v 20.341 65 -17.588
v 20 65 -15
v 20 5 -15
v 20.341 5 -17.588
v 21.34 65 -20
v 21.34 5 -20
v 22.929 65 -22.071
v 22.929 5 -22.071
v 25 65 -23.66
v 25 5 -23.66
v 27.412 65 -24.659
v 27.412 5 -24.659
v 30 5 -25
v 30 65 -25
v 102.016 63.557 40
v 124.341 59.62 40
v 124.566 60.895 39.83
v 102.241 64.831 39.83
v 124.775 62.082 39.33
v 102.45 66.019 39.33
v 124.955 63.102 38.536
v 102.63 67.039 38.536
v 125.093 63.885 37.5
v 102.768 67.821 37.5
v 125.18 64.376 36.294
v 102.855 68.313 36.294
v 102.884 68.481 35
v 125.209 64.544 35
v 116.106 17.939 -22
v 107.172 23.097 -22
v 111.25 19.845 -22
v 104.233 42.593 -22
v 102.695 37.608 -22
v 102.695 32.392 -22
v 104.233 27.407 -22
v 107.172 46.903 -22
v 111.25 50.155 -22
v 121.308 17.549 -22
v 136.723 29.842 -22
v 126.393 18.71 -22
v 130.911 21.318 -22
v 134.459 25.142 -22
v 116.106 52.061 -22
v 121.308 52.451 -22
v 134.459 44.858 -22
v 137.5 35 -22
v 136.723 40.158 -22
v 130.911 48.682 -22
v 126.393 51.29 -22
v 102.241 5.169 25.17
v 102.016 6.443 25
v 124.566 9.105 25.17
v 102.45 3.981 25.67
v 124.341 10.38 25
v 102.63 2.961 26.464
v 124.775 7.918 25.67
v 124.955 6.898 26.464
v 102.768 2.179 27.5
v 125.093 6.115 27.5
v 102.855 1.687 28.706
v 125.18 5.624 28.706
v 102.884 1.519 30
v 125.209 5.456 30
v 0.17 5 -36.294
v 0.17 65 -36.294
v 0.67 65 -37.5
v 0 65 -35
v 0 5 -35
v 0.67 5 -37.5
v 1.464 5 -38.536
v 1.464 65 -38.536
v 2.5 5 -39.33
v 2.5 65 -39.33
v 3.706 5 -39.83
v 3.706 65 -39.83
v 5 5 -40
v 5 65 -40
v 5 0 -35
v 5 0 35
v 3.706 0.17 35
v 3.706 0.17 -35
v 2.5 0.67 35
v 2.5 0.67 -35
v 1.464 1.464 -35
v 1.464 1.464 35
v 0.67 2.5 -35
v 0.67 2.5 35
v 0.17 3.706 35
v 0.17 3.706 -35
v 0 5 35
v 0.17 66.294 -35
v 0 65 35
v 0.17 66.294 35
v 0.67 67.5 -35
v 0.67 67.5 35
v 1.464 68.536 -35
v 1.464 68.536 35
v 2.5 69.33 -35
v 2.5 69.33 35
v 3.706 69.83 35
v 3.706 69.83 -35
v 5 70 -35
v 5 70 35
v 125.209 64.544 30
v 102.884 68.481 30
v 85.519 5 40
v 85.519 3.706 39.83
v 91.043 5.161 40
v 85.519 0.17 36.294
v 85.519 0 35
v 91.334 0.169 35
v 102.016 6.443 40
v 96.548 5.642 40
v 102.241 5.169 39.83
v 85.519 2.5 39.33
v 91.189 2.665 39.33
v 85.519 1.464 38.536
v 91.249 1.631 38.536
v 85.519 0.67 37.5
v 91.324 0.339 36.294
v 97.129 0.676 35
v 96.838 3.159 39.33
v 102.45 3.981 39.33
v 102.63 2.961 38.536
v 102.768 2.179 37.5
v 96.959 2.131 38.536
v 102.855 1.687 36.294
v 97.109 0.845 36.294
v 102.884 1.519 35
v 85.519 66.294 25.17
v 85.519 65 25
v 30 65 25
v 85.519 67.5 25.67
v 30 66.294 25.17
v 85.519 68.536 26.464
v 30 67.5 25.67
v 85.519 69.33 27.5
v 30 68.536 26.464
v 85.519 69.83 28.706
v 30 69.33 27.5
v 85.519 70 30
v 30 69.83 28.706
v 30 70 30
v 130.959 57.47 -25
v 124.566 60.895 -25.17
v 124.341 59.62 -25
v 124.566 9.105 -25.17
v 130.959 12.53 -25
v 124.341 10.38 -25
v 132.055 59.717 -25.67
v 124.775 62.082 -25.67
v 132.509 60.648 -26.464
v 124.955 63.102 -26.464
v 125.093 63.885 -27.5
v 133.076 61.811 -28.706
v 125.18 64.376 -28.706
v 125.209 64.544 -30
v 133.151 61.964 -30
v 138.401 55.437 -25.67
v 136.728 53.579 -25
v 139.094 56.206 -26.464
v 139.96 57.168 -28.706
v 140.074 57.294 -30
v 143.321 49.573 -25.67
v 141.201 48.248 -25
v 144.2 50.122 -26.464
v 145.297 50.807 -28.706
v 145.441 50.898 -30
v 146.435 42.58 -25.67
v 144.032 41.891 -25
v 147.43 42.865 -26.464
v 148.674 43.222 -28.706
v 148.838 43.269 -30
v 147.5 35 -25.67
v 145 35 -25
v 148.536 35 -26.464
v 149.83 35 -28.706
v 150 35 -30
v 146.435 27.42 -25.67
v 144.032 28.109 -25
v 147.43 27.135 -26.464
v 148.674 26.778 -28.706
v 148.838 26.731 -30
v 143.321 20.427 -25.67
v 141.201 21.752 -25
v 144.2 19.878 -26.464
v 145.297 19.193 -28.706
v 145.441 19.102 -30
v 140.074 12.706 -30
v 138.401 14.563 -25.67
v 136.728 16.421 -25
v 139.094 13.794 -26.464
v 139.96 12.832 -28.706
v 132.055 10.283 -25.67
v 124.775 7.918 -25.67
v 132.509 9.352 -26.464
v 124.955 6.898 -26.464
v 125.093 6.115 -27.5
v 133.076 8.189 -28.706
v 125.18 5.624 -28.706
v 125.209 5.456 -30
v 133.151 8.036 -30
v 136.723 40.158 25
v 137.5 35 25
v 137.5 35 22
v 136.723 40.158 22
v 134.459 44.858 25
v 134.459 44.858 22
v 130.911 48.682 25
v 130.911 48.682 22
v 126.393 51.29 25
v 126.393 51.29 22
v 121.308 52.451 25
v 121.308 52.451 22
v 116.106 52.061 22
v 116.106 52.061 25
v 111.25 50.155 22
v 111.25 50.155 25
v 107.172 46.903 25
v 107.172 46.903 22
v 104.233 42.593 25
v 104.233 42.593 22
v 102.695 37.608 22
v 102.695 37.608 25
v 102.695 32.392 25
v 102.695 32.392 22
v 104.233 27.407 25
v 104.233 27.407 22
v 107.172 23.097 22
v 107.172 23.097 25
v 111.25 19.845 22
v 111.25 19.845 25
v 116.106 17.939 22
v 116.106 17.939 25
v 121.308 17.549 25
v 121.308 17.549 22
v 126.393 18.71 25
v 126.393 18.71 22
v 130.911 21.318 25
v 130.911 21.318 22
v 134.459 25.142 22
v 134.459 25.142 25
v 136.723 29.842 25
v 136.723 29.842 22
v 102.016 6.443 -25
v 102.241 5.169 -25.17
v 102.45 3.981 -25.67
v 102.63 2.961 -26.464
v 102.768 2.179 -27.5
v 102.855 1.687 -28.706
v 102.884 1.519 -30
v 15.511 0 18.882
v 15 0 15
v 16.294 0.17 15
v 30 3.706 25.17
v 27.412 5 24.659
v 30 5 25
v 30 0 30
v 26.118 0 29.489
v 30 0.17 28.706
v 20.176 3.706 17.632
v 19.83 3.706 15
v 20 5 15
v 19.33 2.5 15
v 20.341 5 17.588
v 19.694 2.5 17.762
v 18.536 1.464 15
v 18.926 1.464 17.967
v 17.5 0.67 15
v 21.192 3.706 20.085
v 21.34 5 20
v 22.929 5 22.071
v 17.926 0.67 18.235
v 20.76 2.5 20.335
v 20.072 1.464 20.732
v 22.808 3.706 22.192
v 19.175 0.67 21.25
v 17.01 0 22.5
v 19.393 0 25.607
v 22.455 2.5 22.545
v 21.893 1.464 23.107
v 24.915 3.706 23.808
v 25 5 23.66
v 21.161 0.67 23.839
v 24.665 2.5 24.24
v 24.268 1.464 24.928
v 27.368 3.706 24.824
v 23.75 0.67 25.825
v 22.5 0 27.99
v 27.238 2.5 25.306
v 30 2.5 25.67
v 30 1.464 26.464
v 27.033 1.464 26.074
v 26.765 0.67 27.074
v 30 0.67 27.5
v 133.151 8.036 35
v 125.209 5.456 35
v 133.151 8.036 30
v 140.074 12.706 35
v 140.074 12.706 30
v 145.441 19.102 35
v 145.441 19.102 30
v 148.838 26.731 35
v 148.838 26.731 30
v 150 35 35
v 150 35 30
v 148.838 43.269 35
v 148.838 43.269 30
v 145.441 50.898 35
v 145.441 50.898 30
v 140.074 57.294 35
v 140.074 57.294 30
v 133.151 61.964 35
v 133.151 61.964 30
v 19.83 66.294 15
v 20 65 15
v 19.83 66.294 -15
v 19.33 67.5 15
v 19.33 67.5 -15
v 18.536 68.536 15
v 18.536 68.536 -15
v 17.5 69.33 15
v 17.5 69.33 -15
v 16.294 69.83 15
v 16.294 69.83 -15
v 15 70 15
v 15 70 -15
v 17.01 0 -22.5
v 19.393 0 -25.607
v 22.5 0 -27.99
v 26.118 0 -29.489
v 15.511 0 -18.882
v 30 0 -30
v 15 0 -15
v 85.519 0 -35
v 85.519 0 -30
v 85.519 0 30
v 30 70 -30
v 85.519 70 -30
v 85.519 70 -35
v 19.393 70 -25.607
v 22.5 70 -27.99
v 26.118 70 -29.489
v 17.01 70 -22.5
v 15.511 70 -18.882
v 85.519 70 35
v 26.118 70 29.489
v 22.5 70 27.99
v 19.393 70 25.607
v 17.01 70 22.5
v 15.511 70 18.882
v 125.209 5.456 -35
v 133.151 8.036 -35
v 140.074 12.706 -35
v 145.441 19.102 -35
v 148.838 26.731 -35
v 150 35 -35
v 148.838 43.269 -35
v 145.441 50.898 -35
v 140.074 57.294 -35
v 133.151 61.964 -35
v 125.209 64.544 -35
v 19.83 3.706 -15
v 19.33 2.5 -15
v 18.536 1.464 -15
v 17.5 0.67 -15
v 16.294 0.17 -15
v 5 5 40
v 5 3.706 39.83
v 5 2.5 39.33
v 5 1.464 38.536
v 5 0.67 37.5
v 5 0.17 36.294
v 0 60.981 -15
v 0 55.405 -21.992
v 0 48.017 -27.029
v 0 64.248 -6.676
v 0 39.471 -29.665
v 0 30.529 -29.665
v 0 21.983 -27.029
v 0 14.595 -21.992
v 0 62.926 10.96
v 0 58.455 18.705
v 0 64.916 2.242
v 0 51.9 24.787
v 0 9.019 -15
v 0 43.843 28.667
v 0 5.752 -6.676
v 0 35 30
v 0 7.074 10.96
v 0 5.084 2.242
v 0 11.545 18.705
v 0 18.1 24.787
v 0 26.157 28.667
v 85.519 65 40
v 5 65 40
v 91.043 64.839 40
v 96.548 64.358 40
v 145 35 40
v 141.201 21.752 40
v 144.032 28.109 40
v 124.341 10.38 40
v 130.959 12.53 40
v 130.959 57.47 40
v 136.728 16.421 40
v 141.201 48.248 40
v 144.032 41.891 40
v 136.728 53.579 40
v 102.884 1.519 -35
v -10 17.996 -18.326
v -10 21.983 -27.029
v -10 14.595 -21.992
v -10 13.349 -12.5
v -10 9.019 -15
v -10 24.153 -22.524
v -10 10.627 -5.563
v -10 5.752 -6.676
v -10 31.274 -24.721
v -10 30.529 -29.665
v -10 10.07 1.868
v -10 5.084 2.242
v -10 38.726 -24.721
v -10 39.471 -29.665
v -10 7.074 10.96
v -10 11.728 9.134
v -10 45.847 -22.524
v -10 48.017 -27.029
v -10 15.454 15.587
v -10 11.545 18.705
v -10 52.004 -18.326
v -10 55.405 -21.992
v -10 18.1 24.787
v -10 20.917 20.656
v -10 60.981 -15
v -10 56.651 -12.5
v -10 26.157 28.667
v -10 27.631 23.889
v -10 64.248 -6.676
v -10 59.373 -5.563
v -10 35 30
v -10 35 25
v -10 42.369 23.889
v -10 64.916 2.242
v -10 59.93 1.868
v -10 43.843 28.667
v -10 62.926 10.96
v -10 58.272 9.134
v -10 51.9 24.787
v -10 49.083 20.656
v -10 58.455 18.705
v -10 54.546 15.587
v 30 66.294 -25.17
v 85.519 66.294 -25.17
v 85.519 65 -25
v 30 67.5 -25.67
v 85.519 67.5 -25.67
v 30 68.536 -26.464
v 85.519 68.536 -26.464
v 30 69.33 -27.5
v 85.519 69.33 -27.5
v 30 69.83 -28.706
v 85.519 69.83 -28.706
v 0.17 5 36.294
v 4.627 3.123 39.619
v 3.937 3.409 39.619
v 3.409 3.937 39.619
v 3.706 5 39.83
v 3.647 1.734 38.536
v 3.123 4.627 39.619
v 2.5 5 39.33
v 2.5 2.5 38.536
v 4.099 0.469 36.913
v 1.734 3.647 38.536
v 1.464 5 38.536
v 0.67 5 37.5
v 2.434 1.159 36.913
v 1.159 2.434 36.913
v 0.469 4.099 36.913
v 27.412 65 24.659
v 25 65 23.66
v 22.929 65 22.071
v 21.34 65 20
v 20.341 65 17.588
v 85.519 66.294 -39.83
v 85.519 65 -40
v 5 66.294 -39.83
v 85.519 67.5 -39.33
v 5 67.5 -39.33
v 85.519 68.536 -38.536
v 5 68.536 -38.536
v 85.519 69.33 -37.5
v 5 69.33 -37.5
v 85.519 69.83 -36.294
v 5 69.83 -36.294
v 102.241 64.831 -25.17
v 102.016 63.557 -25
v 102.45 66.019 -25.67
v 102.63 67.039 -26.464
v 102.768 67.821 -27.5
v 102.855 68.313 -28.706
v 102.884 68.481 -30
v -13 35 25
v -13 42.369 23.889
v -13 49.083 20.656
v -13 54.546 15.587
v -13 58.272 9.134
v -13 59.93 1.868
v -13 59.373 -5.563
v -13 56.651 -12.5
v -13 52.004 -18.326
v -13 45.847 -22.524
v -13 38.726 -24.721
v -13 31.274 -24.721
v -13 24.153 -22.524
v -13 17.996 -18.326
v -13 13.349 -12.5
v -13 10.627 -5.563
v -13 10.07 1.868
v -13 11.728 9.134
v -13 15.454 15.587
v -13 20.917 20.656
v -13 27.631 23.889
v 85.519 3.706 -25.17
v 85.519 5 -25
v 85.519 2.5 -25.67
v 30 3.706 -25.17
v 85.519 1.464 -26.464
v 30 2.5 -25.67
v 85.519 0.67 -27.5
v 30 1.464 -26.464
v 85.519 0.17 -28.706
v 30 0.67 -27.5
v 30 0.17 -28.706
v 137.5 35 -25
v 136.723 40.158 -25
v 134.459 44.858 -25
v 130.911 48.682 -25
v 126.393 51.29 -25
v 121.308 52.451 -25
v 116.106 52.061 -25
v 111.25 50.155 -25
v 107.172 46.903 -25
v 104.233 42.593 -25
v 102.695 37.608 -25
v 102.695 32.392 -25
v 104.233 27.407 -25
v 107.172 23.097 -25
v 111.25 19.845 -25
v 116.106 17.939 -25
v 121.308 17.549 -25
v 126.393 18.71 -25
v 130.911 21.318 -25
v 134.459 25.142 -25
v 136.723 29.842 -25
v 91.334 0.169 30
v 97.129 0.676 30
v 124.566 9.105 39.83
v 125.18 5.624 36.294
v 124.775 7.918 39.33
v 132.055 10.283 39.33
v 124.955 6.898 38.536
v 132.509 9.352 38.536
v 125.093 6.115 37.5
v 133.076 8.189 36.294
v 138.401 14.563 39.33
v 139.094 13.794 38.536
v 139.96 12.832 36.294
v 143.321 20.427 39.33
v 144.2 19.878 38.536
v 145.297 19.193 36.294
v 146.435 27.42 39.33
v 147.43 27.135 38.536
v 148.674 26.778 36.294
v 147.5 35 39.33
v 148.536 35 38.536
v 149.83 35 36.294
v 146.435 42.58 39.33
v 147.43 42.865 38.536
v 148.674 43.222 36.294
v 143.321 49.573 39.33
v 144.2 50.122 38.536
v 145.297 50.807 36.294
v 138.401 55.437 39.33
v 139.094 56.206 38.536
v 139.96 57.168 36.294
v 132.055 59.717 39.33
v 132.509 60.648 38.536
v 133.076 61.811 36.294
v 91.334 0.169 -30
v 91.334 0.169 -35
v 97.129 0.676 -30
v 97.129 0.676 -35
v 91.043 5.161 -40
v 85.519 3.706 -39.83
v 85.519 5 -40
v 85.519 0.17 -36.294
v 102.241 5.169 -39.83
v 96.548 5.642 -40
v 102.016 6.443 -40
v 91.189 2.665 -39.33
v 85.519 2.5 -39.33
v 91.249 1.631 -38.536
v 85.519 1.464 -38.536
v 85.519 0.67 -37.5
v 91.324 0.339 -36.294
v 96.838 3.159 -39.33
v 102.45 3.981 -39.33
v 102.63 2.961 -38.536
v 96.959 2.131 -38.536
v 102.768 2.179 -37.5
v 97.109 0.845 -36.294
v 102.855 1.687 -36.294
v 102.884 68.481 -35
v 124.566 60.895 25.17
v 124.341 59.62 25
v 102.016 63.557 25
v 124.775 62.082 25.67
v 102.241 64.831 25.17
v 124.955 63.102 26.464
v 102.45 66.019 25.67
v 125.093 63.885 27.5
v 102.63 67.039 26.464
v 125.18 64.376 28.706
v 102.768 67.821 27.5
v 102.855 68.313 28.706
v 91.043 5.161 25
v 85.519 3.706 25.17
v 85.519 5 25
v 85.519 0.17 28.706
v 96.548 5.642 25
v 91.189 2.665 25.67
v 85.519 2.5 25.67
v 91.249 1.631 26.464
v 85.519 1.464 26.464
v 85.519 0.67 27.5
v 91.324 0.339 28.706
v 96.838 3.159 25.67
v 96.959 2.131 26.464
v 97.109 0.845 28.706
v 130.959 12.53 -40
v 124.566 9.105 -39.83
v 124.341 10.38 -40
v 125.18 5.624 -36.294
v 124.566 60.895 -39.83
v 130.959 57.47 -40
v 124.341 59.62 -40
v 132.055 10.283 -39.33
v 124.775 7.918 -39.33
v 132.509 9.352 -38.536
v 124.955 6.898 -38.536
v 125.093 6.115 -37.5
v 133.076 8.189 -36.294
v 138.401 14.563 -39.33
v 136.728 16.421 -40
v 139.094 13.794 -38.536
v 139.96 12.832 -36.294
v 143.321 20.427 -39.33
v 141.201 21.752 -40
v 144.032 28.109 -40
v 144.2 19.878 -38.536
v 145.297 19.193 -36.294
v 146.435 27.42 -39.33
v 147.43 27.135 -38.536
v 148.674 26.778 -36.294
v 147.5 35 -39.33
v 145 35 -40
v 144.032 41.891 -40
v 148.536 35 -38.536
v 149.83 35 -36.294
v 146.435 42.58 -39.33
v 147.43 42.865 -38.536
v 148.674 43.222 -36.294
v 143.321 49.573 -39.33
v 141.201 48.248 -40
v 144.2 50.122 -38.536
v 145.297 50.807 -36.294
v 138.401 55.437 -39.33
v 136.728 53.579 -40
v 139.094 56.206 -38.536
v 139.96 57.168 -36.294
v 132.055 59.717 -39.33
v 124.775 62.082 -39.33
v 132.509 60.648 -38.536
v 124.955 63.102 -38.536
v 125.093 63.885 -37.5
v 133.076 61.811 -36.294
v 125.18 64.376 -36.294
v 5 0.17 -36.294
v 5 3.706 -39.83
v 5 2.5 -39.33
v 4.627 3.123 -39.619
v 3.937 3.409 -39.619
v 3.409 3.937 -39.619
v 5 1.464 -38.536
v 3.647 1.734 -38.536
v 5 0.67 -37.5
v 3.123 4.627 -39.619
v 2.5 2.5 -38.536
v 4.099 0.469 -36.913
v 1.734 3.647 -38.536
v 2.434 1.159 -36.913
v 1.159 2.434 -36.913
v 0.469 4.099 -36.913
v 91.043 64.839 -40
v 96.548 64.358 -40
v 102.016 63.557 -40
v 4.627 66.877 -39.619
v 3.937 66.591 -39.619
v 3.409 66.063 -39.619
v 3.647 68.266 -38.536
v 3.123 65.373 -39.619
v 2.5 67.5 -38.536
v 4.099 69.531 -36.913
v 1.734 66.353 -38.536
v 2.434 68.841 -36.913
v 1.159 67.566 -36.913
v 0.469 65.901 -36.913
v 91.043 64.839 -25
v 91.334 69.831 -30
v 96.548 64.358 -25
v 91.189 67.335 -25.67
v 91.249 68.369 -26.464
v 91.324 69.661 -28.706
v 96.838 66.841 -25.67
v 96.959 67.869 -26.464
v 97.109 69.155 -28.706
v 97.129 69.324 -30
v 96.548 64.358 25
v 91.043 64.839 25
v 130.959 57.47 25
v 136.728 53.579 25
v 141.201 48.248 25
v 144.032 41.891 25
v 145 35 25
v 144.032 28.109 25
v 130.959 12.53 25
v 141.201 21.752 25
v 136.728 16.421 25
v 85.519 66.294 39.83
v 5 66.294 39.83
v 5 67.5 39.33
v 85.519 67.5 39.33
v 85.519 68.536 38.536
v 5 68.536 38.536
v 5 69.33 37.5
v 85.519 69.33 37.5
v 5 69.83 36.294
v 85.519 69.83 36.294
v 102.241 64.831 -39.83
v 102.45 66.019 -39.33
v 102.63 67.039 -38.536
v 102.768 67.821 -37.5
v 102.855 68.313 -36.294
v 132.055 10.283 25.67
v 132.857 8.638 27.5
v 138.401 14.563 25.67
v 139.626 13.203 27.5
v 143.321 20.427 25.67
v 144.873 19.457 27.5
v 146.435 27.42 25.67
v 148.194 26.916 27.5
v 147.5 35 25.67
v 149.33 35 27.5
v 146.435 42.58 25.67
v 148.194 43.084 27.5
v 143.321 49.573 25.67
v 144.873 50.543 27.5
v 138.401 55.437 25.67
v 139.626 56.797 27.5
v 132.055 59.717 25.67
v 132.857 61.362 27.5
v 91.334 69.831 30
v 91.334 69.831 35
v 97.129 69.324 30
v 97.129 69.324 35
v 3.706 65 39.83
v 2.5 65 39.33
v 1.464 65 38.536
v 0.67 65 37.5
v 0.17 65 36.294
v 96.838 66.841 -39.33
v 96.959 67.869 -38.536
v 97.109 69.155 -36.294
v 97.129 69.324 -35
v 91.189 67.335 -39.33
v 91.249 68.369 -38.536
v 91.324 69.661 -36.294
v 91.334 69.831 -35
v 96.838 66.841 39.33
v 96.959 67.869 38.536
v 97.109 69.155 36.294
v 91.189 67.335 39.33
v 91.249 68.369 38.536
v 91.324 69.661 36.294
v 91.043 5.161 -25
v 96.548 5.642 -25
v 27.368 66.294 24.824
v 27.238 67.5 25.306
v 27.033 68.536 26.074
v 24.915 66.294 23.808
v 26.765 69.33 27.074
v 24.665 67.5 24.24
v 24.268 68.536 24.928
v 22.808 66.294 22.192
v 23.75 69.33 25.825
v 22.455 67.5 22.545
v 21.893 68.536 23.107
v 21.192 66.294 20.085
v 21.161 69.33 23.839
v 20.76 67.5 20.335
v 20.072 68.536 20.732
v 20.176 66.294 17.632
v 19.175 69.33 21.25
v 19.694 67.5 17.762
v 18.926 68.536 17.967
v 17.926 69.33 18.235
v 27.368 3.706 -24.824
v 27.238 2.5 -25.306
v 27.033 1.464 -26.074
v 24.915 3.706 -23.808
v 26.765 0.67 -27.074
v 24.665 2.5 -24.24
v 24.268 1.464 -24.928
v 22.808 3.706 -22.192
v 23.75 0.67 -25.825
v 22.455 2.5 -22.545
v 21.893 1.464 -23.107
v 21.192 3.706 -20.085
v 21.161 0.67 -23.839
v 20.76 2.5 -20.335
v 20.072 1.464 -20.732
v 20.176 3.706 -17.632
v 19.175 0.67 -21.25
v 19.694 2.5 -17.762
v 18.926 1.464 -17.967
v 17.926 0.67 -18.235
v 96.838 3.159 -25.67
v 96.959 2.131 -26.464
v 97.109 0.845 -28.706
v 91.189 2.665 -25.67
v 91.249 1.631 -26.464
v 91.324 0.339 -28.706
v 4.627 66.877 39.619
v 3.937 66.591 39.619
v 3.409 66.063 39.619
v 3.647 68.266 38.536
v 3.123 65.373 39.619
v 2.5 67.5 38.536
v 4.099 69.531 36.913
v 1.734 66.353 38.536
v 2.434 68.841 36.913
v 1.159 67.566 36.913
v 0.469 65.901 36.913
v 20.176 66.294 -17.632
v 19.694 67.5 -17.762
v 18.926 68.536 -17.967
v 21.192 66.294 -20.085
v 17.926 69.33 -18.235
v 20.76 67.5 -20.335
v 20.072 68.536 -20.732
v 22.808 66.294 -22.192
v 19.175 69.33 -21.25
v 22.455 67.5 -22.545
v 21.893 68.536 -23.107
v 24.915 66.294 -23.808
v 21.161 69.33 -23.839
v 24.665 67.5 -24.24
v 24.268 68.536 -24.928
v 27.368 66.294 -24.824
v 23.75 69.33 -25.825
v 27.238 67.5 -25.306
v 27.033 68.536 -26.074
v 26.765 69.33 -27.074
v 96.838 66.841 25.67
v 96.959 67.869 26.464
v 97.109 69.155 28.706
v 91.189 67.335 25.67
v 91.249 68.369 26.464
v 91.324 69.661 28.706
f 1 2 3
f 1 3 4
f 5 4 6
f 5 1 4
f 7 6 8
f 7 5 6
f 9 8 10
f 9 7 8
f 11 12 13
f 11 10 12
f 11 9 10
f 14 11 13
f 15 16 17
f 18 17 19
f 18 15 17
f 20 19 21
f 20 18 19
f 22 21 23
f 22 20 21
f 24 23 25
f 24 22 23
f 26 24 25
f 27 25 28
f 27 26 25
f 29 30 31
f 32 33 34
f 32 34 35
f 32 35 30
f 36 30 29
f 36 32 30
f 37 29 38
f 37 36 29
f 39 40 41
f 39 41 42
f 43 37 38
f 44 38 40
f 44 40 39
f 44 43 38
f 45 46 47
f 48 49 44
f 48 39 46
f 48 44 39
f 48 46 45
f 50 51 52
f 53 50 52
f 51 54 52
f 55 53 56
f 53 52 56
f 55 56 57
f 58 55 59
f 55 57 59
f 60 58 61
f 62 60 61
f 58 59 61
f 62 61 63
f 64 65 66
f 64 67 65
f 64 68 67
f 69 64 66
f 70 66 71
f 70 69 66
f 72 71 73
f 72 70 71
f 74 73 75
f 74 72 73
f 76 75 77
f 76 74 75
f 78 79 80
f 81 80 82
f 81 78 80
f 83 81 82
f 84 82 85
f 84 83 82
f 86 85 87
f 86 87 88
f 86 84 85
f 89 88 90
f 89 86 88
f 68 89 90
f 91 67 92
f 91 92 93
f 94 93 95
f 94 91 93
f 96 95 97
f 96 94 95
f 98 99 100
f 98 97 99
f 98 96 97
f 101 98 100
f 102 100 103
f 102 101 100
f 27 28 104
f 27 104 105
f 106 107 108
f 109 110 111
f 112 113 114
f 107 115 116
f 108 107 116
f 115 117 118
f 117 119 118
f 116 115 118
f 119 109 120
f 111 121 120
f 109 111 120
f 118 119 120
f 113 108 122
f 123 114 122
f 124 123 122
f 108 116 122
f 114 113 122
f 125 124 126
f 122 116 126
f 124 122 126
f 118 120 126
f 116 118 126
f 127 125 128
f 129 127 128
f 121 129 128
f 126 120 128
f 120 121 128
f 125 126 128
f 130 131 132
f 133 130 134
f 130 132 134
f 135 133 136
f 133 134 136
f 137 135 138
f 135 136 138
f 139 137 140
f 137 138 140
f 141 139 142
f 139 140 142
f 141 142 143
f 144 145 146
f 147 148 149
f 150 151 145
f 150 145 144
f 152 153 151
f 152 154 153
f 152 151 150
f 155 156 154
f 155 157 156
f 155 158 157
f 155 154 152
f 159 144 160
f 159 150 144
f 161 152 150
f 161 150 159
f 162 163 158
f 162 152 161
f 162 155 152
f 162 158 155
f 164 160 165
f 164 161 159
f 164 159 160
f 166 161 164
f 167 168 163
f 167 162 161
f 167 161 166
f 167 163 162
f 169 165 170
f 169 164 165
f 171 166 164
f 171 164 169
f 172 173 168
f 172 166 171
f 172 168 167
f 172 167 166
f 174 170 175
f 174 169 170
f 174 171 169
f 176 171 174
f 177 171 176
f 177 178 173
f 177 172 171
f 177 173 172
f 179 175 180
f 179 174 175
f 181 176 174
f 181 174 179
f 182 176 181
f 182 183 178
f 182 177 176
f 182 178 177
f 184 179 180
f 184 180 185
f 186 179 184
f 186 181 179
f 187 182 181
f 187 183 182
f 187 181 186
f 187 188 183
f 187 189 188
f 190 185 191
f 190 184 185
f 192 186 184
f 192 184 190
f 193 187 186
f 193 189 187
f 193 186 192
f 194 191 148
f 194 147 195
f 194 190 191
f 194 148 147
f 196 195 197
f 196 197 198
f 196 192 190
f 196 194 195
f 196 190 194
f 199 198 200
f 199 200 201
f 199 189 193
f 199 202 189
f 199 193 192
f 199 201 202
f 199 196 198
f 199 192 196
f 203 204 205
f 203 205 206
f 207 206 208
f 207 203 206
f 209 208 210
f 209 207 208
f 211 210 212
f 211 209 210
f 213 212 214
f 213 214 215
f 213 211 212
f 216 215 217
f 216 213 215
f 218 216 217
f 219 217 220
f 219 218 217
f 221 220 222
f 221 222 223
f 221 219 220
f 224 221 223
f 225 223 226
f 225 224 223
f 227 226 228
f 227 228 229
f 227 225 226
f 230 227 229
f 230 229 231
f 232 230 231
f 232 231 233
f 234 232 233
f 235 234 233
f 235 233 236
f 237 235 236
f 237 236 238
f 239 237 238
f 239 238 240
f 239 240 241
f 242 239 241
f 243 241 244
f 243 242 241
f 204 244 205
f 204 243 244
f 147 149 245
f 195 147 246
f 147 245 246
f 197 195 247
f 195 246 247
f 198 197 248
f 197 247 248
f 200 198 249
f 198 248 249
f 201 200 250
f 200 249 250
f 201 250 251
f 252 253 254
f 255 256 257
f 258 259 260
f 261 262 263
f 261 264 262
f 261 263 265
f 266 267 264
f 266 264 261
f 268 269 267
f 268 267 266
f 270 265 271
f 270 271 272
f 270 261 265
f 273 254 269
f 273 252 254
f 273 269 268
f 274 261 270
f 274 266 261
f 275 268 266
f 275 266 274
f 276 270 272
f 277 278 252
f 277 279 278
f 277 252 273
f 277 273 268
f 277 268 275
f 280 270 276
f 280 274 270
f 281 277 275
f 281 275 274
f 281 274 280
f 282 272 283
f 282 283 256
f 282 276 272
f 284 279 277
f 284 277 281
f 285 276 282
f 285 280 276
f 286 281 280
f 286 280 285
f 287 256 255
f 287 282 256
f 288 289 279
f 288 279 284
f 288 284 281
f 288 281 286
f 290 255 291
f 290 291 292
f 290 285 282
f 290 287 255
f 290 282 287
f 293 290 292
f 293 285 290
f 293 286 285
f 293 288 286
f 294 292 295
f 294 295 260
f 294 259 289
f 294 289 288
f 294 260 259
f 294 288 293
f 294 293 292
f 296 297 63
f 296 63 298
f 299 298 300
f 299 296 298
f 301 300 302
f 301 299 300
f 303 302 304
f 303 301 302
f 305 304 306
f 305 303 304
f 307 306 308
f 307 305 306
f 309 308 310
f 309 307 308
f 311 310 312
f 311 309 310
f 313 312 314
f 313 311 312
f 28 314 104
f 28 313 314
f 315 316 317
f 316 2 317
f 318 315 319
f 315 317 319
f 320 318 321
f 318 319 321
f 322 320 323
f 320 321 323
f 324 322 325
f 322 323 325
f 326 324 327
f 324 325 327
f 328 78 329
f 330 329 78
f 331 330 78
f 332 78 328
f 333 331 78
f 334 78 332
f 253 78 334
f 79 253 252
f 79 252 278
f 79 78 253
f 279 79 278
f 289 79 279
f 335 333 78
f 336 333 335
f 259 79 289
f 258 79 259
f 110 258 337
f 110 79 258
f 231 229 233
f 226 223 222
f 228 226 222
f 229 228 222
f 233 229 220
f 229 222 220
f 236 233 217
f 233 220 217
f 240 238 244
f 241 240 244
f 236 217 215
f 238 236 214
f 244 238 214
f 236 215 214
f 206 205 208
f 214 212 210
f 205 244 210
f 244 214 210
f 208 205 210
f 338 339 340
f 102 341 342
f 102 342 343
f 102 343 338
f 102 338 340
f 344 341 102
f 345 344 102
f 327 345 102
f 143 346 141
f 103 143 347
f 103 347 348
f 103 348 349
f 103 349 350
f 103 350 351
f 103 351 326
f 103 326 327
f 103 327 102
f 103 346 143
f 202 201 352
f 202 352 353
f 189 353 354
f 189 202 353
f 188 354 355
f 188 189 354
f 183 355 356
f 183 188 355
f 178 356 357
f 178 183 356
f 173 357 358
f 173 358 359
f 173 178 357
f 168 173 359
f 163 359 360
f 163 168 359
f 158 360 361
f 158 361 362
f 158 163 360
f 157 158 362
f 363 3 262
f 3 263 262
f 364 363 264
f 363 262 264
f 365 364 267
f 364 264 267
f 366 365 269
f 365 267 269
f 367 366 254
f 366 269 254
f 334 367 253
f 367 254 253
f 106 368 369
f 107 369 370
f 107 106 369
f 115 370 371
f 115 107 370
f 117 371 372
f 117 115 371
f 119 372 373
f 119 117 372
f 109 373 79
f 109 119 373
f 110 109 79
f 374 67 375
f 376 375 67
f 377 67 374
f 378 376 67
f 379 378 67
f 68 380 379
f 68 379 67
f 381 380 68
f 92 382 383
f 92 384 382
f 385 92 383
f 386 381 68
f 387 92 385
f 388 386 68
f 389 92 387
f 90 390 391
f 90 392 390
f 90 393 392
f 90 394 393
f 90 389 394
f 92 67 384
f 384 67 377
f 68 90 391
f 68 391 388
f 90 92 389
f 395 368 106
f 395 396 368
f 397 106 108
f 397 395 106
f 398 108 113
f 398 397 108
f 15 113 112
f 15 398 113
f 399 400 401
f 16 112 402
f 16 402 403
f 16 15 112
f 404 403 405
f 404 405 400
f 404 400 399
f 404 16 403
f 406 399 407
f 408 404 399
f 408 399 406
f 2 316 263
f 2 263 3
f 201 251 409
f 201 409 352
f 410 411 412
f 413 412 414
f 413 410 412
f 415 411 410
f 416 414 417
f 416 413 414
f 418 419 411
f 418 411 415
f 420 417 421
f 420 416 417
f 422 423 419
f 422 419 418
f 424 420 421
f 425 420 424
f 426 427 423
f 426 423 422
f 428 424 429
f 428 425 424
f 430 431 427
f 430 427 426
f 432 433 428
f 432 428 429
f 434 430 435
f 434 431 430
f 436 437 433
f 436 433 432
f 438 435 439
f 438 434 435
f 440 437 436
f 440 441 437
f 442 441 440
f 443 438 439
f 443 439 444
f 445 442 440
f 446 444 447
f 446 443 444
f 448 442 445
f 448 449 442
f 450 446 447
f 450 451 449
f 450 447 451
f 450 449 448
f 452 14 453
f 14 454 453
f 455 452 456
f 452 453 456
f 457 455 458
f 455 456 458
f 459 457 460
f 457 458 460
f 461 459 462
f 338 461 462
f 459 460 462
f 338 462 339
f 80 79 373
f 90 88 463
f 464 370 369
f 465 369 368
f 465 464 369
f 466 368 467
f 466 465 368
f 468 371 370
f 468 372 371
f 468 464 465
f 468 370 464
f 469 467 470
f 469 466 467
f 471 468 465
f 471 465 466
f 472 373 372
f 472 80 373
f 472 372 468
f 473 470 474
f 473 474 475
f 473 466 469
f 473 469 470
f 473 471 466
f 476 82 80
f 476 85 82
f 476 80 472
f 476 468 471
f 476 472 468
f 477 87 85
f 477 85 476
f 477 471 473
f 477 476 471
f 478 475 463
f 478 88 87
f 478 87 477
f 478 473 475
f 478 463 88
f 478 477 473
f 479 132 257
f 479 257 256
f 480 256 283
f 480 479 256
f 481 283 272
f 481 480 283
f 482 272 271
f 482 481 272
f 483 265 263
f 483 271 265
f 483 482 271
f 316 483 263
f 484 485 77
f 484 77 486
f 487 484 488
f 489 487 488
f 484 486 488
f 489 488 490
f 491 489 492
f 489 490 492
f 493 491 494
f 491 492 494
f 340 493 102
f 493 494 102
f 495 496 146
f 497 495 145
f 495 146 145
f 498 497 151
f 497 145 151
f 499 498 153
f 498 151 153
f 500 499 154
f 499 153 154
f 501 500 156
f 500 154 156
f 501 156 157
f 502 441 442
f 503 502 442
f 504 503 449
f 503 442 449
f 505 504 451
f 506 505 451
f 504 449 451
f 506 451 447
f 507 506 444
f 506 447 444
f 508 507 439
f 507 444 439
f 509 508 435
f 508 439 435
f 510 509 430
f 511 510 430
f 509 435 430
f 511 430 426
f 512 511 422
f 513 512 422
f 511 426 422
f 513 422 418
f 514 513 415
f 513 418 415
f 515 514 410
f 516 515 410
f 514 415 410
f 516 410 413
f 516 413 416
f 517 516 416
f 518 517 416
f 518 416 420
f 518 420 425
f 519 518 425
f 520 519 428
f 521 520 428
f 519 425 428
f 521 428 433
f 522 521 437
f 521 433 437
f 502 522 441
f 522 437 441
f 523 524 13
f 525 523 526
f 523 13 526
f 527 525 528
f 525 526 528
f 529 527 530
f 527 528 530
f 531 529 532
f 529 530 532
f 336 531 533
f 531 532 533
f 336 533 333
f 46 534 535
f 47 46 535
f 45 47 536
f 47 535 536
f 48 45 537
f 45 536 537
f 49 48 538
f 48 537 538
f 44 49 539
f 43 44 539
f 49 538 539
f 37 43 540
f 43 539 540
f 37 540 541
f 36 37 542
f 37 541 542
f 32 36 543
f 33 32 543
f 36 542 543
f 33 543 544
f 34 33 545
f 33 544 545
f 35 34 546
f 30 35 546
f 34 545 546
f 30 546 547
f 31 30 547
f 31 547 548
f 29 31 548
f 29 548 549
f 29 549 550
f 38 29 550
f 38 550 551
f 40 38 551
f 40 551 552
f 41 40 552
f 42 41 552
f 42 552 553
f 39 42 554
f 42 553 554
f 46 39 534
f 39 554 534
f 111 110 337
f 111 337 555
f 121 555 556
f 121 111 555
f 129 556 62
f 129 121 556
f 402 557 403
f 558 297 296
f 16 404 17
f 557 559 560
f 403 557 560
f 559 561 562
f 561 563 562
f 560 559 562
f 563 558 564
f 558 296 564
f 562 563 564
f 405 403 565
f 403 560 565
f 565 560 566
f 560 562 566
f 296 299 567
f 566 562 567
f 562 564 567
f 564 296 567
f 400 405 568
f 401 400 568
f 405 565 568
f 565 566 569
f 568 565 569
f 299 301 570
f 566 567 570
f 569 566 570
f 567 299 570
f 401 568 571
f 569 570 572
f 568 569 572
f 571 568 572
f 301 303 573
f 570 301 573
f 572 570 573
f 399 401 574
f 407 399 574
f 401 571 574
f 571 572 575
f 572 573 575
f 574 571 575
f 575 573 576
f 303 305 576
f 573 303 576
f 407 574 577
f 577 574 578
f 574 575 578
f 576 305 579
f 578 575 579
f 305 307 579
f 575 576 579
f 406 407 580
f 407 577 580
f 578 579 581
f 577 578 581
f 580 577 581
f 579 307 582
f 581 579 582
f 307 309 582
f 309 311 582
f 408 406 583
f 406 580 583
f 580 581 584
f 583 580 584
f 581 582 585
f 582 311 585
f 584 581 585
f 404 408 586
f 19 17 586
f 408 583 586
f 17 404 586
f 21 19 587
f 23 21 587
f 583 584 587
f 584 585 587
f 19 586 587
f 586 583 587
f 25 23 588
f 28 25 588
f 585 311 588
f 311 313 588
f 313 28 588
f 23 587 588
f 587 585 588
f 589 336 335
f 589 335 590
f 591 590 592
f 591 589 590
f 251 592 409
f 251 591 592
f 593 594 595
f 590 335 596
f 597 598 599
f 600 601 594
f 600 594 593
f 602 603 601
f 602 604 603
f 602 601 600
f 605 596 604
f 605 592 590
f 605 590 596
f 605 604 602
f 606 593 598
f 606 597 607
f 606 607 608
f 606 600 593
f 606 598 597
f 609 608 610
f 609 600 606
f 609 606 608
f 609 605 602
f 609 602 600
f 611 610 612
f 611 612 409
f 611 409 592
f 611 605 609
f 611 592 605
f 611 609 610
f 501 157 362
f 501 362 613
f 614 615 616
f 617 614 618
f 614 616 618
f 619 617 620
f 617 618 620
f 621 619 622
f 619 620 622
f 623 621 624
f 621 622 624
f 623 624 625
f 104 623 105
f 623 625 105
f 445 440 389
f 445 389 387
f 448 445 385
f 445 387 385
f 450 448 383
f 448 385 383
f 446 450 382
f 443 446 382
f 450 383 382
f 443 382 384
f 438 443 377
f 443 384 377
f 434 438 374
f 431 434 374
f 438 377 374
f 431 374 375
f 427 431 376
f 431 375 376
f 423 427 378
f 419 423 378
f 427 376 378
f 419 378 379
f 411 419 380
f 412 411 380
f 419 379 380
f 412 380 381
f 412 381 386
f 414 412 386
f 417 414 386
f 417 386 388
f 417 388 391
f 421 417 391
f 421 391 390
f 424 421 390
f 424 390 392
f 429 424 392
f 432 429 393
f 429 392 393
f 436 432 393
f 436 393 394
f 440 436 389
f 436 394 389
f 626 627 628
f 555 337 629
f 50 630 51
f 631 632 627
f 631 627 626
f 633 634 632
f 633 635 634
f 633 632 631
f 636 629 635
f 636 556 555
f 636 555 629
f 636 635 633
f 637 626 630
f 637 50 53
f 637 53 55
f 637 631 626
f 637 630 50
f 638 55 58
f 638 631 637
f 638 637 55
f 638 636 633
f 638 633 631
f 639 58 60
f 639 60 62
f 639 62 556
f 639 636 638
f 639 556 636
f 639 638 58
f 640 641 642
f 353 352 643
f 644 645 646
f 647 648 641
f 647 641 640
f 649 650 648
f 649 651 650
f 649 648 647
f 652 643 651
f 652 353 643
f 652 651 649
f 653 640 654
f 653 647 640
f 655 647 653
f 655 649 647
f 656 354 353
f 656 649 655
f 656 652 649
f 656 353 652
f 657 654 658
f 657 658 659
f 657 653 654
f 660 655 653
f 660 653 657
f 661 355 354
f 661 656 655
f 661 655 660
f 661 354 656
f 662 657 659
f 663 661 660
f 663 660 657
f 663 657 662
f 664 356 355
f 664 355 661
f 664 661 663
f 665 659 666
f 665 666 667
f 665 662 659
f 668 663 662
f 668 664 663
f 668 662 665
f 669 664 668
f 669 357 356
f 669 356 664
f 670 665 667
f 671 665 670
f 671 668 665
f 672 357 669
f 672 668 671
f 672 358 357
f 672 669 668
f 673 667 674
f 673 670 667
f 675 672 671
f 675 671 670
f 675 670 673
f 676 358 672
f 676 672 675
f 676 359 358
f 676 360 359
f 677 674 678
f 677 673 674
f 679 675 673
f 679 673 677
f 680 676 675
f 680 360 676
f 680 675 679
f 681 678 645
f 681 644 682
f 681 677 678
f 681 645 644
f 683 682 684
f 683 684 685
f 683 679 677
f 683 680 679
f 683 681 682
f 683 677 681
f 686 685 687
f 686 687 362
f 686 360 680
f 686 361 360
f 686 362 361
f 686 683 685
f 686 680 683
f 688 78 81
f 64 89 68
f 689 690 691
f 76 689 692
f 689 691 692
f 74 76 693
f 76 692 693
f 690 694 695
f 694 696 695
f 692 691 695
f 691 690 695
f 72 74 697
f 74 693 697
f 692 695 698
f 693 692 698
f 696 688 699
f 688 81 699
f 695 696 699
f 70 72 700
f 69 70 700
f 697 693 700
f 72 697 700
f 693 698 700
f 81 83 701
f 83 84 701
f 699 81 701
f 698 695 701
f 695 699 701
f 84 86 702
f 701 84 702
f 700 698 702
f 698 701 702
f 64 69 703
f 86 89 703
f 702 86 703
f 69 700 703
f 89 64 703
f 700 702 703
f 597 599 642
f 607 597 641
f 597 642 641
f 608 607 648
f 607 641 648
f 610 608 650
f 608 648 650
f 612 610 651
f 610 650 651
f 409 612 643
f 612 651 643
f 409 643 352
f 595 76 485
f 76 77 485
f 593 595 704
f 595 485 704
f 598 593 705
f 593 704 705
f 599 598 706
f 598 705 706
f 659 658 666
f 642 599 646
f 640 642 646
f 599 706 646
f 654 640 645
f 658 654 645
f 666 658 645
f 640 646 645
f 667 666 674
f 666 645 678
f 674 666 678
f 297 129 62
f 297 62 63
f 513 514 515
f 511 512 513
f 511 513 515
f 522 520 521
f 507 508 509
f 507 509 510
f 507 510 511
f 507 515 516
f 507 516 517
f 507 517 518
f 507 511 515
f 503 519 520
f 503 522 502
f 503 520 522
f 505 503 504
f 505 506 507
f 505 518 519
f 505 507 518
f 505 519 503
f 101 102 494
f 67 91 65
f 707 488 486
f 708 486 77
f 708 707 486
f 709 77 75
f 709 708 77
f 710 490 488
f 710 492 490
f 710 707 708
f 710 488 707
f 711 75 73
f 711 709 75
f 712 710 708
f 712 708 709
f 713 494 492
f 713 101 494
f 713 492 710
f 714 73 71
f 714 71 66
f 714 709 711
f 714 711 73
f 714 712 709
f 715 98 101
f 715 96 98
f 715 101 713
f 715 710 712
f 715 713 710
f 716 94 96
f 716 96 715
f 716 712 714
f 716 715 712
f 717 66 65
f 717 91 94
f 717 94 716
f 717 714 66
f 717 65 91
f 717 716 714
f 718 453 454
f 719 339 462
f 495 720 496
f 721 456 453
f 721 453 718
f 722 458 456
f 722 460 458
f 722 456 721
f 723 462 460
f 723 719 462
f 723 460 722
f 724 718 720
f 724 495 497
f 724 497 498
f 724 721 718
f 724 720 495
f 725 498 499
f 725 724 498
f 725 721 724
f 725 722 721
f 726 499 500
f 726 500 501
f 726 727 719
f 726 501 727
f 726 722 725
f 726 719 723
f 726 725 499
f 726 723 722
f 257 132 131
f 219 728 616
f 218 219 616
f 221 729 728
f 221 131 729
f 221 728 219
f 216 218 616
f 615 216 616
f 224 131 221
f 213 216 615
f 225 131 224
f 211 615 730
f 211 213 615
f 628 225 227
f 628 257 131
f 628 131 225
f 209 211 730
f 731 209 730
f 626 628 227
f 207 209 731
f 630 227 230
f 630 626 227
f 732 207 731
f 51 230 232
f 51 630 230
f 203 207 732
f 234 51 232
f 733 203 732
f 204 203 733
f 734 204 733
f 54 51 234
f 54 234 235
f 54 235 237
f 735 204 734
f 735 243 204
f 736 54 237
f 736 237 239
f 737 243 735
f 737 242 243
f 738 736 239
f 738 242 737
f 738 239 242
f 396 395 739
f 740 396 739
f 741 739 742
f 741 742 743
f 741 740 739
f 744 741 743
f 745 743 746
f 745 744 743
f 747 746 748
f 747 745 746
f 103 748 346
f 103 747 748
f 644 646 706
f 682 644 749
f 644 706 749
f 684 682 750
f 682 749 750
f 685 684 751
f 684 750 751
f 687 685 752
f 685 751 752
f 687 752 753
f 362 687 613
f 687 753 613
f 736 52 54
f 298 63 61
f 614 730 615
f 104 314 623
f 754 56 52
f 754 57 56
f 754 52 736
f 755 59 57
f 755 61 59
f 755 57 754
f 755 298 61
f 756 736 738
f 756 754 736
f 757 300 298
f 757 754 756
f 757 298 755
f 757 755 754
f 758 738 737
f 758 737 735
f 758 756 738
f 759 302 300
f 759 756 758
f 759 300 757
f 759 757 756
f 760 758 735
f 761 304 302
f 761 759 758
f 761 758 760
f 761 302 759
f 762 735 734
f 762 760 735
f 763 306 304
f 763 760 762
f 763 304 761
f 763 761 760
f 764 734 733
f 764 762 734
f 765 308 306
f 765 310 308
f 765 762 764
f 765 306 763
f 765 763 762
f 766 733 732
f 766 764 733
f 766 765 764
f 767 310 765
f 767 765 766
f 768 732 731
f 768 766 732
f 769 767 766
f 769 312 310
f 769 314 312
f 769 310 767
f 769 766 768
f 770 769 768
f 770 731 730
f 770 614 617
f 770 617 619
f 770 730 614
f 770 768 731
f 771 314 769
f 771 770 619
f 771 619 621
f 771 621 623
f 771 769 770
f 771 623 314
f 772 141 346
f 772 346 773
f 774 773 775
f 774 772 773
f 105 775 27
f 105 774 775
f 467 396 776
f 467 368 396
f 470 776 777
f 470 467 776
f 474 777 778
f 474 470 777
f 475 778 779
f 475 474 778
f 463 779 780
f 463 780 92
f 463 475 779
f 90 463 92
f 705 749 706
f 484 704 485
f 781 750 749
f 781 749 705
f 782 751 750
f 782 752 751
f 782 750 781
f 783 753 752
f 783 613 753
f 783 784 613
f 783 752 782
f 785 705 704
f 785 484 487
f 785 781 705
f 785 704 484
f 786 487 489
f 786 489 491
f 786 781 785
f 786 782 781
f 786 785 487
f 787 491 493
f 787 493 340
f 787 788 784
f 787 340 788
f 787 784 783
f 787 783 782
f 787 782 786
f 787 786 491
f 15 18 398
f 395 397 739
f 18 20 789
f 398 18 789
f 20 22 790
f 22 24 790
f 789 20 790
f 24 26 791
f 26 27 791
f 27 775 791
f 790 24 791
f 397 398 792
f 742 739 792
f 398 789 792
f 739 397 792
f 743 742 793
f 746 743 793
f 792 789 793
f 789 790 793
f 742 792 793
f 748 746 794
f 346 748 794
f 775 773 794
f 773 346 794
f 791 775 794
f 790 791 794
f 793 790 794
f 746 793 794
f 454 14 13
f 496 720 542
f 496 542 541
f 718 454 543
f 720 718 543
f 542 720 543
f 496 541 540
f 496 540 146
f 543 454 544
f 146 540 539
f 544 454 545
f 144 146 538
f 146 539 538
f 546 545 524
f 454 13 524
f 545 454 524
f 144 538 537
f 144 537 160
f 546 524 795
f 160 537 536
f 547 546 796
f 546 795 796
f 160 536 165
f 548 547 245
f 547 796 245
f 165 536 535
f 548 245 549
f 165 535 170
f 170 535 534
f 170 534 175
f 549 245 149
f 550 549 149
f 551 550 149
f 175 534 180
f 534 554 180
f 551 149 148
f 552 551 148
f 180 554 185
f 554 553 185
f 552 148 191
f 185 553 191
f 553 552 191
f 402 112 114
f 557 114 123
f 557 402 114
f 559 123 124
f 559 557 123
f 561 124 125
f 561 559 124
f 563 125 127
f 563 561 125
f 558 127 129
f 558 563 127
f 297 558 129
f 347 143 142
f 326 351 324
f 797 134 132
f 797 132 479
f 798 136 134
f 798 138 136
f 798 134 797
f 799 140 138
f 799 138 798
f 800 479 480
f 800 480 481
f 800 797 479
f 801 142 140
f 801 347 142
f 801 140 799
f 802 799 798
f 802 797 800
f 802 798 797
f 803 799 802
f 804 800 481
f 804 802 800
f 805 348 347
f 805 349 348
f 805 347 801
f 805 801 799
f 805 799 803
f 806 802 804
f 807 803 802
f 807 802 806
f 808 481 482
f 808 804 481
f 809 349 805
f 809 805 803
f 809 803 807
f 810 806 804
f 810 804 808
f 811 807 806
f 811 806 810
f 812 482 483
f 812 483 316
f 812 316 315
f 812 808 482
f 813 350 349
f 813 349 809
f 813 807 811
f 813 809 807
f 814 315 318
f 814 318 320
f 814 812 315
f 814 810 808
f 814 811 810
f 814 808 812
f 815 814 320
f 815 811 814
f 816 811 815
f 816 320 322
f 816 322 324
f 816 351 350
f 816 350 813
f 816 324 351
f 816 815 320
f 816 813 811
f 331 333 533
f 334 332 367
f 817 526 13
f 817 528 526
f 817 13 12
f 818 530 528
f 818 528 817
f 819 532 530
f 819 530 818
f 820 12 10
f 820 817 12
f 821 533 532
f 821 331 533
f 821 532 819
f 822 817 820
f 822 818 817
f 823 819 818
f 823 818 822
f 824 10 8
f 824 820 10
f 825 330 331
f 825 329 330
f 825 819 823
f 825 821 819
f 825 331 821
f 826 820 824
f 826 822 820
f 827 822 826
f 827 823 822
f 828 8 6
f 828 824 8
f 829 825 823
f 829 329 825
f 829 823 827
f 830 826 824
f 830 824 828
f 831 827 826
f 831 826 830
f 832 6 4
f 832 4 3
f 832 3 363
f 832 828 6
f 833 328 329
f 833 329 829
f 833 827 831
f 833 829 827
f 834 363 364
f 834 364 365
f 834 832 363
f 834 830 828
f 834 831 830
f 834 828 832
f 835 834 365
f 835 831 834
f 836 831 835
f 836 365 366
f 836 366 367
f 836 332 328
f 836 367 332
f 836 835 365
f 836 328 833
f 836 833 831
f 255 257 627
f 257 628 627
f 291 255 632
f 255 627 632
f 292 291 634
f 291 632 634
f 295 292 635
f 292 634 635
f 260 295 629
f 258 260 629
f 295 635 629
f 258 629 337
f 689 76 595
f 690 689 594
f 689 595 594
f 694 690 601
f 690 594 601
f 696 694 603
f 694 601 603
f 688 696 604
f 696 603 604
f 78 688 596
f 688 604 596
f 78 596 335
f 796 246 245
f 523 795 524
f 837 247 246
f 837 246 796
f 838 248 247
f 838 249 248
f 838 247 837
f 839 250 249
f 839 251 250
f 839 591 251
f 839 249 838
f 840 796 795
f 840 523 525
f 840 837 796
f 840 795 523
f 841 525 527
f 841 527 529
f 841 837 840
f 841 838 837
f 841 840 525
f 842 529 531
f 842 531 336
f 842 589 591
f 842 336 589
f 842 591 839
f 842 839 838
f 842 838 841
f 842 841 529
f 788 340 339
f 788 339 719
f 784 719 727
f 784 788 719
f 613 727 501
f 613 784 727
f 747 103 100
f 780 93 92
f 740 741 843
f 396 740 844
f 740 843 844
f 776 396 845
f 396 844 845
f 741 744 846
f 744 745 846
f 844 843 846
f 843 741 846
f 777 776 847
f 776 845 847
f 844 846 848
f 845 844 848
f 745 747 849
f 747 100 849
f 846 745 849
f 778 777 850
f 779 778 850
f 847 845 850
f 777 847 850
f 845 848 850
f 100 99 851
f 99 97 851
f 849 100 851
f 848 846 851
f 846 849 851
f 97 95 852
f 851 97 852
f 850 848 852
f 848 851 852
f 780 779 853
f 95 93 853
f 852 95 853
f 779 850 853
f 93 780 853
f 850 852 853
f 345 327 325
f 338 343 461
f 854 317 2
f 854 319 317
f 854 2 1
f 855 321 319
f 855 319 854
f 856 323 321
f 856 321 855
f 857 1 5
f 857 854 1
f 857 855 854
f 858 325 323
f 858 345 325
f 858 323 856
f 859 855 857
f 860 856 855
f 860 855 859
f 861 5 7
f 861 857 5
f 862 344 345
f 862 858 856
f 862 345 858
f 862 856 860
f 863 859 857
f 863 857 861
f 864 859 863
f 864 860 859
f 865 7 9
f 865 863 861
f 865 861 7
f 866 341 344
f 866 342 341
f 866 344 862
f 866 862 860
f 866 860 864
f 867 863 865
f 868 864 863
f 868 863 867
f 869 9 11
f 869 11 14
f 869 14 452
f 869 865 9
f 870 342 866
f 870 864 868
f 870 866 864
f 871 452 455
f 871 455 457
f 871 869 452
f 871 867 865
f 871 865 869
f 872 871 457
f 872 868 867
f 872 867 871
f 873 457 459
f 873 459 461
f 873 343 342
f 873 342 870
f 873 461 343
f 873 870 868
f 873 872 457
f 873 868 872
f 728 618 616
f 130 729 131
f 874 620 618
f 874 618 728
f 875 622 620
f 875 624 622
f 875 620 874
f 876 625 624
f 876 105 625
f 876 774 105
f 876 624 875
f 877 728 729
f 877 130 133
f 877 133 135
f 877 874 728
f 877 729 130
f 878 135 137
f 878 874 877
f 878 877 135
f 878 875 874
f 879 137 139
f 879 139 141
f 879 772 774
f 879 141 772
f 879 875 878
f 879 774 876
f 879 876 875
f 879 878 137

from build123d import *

# Parameters (mm, degrees)
BOSS_EXTRUDE1_DEPTH = 40
SKETCH2_W           = 180
SKETCH2_H           = 50
CUT_EXTRUDE1_DEPTH  = 171.293863659
SKETCH3_R           = 17.5
BOSS_EXTRUDE2_DEPTH = 3
SKETCH4_R           = 30
BOSS_EXTRUDE3_DEPTH = 10
SKETCH5_R           = 25
BOSS_EXTRUDE4_DEPTH = 3
FILLET1_R           = 100
FILLET2_R           = 10
FILLET3_R           = 5


with BuildPart() as part:
    # Sketch1 → Boss-Extrude1 (new, symmetric)
    with BuildSketch(Plane.XY):
        with BuildLine():
            Line((0, 0), (94.268250808, 0))
            Line((94.268250808, 0), (125.20944533, 5.45576741))
            ThreePointArc((125.20944533, 5.45576741), (150, 35), (125.20944533, 64.54423259))
            Line((125.20944533, 64.54423259), (94.268250808, 70))
            Line((94.268250808, 70), (0, 70))
            Line((0, 70), (0, 0))
        make_face()
    extrude(amount=BOSS_EXTRUDE1_DEPTH, both=True)

    # Sketch2 → Cut-Extrude1 (cut, through all)
    with BuildSketch(Plane(origin=(0, 0, 0), x_dir=(1, 0, 0), z_dir=(0, 1, 0))):
        with Locations((110, 0)):
            Rectangle(SKETCH2_W, SKETCH2_H)
    extrude(amount=CUT_EXTRUDE1_DEPTH, mode=Mode.SUBTRACT)

    # Sketch3 → Boss-Extrude2 (add)
    with BuildSketch(Plane.XY.offset(-25)):
        with Locations((120, 35)):
            Circle(SKETCH3_R)
    boss_extrude2 = extrude(amount=BOSS_EXTRUDE2_DEPTH)

    # Mirror1: Boss-Extrude2 across plane
    add(boss_extrude2.mirror(Plane.XY))

    # Sketch4 → Boss-Extrude3 (add)
    with BuildSketch(Plane.ZY):
        with Locations((0, 35)):
            Circle(SKETCH4_R)
    extrude(amount=BOSS_EXTRUDE3_DEPTH)

    # Sketch5 → Boss-Extrude4 (add)
    with BuildSketch(Plane.ZY.offset(10)):
        with Locations((0, 35)):
            Circle(SKETCH5_R)
    extrude(amount=BOSS_EXTRUDE4_DEPTH)

    # Fillet1
    fillet1_edges = [part.edges().sort_by_distance(p)[0] for p in [
        (94.268250808, 70, 32.5),
        (94.268250808, 0, 32.5),
        (94.268250808, 70, -32.5),
        (94.268250808, 0, -32.5),
    ]]
    fillet(fillet1_edges, radius=FILLET1_R)

    # Fillet2
    fillet2_edges = [part.edges().sort_by_distance(p)[0] for p in [
        (20, 35, 25),
        (20, 35, -25),
    ]]
    fillet(fillet2_edges, radius=FILLET2_R)

    # Fillet3
    fillet3_edges = [part.edges().sort_by_distance(p)[0] for p in [
        (0, 70, 0),
        (0, 0, 0),
        (150, 35, 40),
        (114.046823776, 66.512503946, 40),
        (150, 35, 25),
        (114.046823776, 3.487496054, 25),
        (150, 35, -25),
        (114.046823776, 66.512503946, -25),
        (0, 35, 40),
        (114.046823776, 3.487496054, -25),
        (114.046823776, 3.487496054, -40),
        (114.046823776, 66.512503946, -40),
        (42.759692228, 70, -40),
        (94.23495873, 69.619469809, -40),
        (94.23495873, 0.380530191, -40),
        (57.759692228, 0, -25),
        (150, 35, -40),
        (42.759692228, 0, 40),
        (57.759692228, 70, -25),
        (94.23495873, 69.619469809, -25),
        (94.23495873, 0.380530191, -25),
        (114.046823776, 3.487496054, 40),
        (114.046823776, 66.512503946, 25),
        (94.23495873, 69.619469809, 25),
        (94.23495873, 0.380530191, 25),
        (42.759692228, 70, 40),
        (94.23495873, 69.619469809, 40),
        (94.23495873, 0.380530191, 40),
        (42.759692228, 0, -40),
        (0, 35, -40),
        (20, 0, 0),
        (20, 70, 0),
        (57.759692228, 0, 25),
        (57.759692228, 70, 25),
        (22.928932188, 0, -22.071067812),
        (22.928932188, 70, -22.071067812),
        (22.928932188, 0, 22.071067812),
        (22.928932188, 70, 22.071067812),
    ]]
    fillet(fillet3_edges, radius=FILLET3_R - 0.0001)  # a hair under: the kernel refuses the full size


solid = part.part
